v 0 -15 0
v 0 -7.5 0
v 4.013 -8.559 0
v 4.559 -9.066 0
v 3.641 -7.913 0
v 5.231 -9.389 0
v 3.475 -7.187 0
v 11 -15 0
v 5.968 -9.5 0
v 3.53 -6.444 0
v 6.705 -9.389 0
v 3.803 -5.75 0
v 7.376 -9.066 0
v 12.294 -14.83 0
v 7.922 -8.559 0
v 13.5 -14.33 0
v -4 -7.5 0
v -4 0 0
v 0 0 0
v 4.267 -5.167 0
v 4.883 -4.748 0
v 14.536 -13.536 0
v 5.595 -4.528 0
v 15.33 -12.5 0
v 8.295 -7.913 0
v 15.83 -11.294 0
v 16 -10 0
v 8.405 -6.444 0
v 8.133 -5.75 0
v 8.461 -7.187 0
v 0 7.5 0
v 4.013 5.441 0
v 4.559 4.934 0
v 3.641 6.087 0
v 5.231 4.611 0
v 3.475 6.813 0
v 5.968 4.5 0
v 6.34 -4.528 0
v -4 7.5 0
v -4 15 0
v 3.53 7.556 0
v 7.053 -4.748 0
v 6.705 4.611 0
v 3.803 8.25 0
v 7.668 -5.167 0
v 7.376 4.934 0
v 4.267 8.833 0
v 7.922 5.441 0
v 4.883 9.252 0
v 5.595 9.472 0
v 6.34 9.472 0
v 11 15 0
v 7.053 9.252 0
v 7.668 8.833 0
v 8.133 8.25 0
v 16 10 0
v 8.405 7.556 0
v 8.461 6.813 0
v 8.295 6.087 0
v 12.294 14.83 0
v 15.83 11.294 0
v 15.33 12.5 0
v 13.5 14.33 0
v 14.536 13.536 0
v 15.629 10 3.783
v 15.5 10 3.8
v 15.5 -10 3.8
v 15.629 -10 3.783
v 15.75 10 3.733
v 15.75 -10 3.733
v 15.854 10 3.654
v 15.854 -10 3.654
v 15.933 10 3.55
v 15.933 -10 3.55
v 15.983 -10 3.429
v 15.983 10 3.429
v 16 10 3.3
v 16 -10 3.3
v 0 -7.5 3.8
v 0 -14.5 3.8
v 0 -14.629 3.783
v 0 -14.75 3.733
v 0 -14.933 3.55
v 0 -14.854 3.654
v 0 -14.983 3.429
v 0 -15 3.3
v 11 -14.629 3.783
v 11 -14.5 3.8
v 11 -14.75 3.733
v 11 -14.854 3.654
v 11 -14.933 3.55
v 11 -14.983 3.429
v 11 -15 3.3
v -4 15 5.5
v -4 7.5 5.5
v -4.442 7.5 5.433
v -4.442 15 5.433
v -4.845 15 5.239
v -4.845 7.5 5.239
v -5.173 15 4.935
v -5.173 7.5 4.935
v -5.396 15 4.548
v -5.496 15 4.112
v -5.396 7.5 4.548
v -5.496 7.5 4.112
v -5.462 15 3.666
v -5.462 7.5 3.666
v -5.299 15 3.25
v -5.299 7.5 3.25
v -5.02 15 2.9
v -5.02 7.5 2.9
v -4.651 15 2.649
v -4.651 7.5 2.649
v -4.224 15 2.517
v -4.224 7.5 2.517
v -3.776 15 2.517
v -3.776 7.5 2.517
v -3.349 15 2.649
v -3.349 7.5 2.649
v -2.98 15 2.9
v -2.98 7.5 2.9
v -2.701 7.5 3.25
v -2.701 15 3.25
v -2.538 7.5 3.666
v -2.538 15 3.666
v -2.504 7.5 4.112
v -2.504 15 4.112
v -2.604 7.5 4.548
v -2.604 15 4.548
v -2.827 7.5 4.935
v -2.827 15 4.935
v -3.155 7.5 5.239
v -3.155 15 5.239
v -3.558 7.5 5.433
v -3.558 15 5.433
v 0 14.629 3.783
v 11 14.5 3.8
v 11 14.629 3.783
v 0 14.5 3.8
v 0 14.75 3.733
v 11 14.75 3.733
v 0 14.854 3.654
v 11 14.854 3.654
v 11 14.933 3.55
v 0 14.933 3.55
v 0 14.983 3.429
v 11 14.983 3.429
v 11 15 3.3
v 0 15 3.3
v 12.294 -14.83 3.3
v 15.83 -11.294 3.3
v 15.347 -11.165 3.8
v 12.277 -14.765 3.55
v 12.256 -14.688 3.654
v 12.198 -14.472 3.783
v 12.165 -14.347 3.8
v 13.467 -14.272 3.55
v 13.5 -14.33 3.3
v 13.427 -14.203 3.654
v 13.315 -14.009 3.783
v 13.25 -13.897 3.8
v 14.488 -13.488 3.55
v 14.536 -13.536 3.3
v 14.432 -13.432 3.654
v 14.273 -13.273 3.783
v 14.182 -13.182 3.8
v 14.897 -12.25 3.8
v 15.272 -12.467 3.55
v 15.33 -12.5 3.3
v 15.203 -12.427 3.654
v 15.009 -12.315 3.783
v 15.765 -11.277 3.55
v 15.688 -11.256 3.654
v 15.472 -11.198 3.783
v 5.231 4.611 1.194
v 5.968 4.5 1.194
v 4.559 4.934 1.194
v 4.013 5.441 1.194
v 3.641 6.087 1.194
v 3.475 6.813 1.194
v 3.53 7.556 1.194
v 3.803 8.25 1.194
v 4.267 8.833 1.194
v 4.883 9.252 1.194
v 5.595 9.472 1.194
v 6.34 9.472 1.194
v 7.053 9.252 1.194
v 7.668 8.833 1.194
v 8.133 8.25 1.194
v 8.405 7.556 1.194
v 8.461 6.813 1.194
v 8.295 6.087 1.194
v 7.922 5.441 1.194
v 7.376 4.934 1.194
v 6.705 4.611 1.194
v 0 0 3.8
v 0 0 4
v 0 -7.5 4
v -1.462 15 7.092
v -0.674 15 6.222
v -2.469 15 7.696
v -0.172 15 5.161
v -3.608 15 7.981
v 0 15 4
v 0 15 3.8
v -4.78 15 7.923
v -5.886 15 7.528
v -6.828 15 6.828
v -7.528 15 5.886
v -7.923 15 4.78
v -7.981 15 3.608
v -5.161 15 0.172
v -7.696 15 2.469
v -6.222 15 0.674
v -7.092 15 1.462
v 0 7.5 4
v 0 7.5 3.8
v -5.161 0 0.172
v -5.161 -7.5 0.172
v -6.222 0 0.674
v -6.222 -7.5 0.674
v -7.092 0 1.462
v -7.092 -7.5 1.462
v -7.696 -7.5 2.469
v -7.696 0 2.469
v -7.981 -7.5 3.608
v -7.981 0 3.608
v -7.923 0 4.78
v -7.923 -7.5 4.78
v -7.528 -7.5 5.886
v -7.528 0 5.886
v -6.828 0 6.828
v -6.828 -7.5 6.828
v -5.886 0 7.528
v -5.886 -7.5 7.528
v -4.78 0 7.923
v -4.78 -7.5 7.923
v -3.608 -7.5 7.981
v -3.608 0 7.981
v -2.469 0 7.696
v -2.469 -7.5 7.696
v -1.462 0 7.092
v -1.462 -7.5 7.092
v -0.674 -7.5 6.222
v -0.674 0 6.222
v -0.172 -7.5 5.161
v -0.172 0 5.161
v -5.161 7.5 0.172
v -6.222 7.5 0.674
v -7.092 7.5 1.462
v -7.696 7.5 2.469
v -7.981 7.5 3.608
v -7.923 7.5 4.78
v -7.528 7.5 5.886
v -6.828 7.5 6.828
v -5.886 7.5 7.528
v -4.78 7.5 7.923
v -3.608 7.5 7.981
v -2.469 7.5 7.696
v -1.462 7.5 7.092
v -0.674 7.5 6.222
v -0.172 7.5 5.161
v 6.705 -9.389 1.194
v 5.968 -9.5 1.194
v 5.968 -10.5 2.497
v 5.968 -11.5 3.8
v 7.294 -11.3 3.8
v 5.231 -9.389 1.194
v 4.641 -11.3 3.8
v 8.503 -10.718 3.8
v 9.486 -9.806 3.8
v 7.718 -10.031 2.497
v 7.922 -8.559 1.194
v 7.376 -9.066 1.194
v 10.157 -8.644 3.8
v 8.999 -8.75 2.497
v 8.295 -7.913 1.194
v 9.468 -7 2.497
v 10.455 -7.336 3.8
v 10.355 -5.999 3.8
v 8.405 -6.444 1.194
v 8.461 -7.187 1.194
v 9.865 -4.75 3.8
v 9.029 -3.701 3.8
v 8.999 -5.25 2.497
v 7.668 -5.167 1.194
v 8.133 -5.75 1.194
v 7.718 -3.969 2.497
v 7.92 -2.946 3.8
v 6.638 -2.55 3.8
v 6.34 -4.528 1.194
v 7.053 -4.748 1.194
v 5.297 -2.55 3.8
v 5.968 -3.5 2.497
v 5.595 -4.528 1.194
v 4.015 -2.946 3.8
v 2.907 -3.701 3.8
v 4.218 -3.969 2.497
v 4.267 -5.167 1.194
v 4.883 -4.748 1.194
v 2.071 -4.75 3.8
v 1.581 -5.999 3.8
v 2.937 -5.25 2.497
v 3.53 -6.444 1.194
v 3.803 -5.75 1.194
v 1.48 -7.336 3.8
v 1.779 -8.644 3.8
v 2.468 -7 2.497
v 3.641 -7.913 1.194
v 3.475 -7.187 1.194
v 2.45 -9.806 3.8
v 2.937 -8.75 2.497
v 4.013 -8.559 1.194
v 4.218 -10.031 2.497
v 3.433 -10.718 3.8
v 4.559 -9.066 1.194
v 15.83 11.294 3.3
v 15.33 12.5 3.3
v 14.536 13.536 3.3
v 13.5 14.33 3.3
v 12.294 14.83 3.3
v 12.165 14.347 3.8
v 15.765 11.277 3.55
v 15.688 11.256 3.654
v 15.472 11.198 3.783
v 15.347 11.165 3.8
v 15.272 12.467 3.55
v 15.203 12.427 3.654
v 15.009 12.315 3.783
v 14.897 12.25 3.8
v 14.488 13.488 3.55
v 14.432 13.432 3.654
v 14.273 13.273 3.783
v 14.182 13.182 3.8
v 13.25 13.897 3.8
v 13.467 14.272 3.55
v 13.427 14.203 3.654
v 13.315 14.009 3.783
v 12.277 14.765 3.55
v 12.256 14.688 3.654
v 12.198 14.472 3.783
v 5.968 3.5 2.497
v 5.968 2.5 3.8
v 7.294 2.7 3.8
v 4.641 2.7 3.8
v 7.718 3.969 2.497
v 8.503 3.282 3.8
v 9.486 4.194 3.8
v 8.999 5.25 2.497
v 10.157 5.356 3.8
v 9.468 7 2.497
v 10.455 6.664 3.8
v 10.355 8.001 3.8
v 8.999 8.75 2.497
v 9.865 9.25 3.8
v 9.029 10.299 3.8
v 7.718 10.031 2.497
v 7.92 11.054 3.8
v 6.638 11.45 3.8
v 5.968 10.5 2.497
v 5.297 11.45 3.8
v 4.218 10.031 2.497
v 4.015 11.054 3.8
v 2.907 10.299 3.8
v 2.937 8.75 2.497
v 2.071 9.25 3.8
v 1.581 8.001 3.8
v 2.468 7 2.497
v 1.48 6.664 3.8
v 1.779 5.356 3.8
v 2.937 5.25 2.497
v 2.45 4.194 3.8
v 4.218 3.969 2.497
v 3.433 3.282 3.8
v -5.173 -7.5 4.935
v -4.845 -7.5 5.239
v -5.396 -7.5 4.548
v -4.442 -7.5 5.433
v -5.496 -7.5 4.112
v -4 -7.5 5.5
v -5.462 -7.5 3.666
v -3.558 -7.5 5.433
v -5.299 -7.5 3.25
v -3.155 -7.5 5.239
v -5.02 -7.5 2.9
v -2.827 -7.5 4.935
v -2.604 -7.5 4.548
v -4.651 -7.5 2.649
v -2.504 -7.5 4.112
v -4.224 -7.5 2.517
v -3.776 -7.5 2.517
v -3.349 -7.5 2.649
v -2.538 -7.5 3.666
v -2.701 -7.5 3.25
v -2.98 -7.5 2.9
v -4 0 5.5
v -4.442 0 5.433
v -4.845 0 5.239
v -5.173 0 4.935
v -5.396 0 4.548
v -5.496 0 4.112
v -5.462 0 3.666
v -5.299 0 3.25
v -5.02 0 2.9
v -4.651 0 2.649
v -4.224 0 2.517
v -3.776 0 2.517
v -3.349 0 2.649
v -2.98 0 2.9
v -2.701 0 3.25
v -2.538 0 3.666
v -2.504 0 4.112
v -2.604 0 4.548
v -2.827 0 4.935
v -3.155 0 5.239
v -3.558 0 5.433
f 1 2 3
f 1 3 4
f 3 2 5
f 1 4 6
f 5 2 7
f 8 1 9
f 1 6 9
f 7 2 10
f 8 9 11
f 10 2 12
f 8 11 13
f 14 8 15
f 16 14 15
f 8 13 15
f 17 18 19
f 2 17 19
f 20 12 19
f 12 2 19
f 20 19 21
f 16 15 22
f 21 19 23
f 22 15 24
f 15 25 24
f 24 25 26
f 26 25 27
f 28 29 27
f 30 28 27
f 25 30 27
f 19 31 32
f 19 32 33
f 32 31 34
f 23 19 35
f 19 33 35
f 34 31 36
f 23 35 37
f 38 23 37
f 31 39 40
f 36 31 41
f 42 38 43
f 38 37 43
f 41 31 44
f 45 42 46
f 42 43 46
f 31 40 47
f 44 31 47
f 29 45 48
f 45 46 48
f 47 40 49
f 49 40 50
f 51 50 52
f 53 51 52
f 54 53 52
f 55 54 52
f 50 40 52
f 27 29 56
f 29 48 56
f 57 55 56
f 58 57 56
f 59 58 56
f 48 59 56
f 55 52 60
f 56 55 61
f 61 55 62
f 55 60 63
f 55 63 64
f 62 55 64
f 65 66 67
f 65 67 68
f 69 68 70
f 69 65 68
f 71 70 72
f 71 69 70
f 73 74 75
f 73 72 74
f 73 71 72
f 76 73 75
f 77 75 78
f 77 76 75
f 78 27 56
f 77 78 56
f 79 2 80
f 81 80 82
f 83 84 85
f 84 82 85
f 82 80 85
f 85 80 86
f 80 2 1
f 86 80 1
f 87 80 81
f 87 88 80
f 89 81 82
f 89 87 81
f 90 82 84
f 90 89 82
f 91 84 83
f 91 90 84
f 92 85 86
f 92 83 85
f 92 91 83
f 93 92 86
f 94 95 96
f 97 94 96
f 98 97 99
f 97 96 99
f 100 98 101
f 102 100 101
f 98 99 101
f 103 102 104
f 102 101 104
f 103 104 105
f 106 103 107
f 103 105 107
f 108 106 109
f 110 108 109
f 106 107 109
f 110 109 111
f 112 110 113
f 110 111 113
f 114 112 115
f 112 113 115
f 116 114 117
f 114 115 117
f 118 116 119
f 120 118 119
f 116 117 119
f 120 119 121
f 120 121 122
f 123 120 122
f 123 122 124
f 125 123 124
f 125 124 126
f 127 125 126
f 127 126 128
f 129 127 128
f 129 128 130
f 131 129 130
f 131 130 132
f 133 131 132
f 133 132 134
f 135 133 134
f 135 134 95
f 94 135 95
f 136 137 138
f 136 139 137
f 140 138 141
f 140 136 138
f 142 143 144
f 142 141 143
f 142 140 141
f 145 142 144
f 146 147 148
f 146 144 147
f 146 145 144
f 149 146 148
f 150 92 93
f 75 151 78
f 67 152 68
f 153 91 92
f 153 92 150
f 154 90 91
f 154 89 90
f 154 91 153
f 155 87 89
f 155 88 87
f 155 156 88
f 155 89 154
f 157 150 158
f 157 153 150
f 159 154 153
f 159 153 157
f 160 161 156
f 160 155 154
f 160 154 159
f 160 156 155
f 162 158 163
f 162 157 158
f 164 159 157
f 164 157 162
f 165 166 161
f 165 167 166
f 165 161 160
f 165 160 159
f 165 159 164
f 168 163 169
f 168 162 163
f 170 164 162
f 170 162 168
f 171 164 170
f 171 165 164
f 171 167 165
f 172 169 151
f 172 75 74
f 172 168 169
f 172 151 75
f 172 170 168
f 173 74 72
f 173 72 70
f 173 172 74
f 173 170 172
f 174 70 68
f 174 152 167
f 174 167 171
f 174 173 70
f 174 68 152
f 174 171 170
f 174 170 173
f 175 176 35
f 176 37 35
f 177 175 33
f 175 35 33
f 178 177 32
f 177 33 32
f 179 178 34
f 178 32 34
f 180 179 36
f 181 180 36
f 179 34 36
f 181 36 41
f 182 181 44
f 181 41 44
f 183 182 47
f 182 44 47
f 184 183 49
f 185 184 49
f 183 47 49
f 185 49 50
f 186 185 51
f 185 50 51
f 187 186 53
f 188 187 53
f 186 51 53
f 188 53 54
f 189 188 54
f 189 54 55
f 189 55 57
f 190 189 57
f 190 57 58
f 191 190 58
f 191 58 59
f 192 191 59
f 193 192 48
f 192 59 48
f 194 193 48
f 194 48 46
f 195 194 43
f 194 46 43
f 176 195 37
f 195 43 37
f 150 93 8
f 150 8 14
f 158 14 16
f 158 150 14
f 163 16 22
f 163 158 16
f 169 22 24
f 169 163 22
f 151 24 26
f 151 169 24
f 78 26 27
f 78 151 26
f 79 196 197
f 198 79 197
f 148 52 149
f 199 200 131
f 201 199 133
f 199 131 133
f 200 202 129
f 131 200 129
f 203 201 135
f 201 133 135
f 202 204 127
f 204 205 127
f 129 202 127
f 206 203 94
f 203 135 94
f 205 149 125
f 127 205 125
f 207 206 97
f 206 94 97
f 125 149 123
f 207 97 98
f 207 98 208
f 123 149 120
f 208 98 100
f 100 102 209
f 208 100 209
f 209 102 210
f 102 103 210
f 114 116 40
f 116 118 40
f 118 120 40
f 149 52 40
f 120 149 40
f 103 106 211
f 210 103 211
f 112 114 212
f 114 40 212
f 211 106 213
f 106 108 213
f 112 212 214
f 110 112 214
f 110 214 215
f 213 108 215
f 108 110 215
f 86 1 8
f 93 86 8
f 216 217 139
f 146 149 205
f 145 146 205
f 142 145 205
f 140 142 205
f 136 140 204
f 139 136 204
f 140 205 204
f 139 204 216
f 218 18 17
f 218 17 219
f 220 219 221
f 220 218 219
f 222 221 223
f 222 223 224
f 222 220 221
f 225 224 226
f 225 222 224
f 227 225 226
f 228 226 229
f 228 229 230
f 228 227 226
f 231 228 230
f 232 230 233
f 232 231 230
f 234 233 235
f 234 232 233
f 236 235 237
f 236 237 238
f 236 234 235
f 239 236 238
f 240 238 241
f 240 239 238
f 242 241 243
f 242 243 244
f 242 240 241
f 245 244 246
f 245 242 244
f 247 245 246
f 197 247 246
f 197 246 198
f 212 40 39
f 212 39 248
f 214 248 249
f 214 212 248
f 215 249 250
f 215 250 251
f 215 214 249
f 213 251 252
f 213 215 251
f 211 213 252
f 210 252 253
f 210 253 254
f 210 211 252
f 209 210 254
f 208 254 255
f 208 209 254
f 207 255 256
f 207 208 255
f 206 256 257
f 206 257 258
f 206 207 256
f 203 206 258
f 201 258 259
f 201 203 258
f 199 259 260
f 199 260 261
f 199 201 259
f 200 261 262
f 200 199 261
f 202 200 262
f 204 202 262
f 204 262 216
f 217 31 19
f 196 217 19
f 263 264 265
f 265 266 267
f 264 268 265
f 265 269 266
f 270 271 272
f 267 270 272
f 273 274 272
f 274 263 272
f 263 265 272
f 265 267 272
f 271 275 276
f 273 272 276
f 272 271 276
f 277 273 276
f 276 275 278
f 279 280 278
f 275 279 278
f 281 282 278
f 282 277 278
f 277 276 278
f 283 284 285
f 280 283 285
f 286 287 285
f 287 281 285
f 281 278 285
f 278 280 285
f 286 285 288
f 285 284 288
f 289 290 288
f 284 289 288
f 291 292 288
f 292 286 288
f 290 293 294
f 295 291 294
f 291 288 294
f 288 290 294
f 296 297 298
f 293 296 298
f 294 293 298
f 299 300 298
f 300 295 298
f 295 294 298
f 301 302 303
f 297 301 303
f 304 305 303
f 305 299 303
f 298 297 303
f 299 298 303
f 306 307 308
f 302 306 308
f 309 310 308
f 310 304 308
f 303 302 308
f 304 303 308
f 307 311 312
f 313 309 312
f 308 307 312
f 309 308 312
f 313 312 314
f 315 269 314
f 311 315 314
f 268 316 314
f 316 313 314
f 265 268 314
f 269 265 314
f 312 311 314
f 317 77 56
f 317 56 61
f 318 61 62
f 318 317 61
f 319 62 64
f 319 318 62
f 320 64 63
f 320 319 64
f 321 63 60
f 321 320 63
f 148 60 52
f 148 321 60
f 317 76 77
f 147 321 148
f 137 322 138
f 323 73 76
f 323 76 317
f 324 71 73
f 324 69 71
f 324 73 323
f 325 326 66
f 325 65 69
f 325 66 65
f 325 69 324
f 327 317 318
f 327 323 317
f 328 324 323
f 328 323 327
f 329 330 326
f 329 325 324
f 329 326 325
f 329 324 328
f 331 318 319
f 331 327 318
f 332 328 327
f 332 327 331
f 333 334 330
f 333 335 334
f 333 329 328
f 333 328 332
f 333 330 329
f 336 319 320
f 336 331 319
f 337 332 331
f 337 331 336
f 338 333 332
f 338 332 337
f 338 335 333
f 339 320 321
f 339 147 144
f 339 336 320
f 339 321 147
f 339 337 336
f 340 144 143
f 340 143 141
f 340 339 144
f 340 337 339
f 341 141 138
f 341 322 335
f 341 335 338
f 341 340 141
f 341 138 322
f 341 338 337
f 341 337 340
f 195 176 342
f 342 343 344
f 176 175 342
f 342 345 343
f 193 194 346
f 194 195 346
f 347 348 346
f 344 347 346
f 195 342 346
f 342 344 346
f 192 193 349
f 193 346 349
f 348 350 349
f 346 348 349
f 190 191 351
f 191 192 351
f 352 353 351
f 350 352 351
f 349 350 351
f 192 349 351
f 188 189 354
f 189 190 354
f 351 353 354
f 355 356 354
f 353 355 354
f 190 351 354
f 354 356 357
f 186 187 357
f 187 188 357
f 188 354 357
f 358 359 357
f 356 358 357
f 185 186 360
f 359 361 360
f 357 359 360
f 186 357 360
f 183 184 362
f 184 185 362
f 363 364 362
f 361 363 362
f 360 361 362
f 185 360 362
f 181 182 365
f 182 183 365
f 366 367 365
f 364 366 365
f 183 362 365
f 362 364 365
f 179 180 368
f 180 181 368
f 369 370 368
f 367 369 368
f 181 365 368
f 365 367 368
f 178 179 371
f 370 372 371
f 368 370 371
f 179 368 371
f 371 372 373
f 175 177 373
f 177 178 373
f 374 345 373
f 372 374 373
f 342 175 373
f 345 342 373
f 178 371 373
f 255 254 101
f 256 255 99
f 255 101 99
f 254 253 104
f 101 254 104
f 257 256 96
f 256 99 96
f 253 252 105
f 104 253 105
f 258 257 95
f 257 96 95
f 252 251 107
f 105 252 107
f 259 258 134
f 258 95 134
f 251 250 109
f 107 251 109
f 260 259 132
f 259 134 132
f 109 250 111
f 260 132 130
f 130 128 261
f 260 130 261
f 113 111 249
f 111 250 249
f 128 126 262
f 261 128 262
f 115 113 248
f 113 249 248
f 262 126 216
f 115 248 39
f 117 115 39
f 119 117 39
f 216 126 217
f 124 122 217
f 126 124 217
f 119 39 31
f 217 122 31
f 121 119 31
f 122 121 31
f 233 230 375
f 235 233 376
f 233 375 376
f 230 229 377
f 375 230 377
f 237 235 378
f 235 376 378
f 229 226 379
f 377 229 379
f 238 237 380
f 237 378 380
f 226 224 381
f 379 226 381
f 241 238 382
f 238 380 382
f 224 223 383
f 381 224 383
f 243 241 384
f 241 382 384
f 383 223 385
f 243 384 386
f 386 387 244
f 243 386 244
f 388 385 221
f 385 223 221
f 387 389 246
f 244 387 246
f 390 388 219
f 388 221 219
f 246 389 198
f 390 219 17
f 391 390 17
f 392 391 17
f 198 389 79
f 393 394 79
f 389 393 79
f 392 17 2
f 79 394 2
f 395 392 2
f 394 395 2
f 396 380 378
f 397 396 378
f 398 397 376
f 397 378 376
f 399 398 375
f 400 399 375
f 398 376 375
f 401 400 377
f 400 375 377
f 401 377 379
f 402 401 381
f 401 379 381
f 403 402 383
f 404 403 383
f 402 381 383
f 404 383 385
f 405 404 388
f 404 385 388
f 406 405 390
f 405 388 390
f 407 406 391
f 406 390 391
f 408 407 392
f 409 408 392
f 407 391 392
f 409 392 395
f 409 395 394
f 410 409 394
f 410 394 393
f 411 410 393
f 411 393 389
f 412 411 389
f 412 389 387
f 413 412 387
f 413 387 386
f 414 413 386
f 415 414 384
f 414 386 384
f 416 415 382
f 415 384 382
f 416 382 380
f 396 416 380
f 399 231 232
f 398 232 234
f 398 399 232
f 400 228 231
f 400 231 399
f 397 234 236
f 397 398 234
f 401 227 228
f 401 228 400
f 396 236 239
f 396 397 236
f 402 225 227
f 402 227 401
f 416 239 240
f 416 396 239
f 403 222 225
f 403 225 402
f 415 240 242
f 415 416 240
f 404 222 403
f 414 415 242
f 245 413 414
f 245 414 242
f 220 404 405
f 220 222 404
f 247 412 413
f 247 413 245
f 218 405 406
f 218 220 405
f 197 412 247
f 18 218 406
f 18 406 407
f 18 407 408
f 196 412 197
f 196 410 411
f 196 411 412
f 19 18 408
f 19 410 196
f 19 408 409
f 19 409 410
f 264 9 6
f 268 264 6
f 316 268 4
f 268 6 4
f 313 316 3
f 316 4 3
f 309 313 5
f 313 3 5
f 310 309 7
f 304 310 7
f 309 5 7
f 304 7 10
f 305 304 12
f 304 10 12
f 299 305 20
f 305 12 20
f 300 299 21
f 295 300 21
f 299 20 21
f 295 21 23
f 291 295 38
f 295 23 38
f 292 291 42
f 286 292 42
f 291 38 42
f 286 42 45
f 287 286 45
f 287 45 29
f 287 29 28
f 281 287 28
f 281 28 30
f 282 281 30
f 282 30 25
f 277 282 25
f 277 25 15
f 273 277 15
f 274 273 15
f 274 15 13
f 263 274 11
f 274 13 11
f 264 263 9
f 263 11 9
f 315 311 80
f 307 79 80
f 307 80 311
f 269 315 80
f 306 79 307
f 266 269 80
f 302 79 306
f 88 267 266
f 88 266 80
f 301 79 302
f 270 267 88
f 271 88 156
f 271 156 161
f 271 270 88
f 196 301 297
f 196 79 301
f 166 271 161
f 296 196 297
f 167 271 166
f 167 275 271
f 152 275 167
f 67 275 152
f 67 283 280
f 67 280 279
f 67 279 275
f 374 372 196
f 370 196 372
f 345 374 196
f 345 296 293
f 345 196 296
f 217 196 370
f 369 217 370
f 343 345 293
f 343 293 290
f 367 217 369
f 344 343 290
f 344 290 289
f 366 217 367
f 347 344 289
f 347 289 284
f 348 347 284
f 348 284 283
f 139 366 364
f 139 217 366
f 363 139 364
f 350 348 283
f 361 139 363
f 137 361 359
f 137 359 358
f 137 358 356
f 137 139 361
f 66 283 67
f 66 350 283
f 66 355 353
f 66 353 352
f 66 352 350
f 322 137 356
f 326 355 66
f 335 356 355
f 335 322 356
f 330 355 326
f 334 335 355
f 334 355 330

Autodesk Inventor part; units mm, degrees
ref_plane "YZ Plane" through (0, 0, 0) normal (1, 0, 0) x (0, 1, 0)
ref_plane "XZ Plane" through (0, 0, 0) normal (0, 1, 0) x (-1, 0, 0)
ref_plane "XY Plane" through (0, 0, 0) normal (0, 0, 1) x (1, 0, 0)
sketch "Esquisse7" plane through (0, 0, 0) normal (0, 0, 1) x (1, 0, 0)
  line L0 (0, -15) -> (16, -15)
  line L1 (16, -15) -> (16, 15)
  line L2 (16, 15) -> (0, 15)
  line L3 (0, 15) -> (0, -15)
  point P0 (0, 0)
  point P1 (0, 0)
  dimension "Largueur" = 16
  dimension "Hauteur" = 30
extrude "Extrusion4" add sketch "Esquisse7" along normal blind 3.8
sketch "Esquisse9" plane through (0, 15, 0) normal (0, 1, 0) x (1, 0, 0)
  arc A0 (-4, 0) -> (0, -4) centre (-4, -4) ccw
  line L0 (0, 0) -> (0, -3.8) construction
  line L1 (16, 0) -> (0, 0) construction
  line L2 (-4, 0) -> (0, 0)
  line L3 (0, 0) -> (0, -4)
  dimension "d41" = 8
extrude "Extrusion6" add sketch "Esquisse9" against normal blind 7.5
pattern_linear "Réseau rectangulaire3" count 2 spacing 15 along (0, -1, 0) of "Extrusion6"
sketch "Esquisse10" plane through (16, 15, 3.8) normal (0, 1, 0) x (1, 0, 0)
  arc A0 (-20, 3.8) -> (-16, -0.2) centre (-20, -0.2) ccw construction
  point P0 (-16, 3.8)
  point P1 (-16.0515, -0.84)
hole "Perçage2" at (-4, 15, 4) direction (0, -1, 0) diameter 3 end through all
fillet "Congé4" radius 5 2 edges at (16, 15, 1.9) (16, -15, 1.9)
sketch "Esquisse11" plane through (0, 0, 3.8) normal (0, 0, 1) x (1, 0, 0)
  line L0 (11, 15) -> (0, 15) construction
  point P0 (0, 0)
  point P1 (5.9678, 7)
  point P2 (5.9678, -7)
  point P3 (0.9356, 15)
  point P4 (5.9678, 15)
  dimension "d56" = 14
  dimension "d57" = 7
hole "Perçage3" at (5.9678, 7, 3.8) at (5.9678, -7, 3.8) direction (0, 0, -1) diameter 5 end through all countersink diameter 9 countersink angle 75
fillet "Congé5" radius 0.5 5 edges at (14.5355, 13.5355, 3.8) (16, 0, 3.8) (14.5355, -13.5355, 3.8) (5.5, -15, 3.8) (5.5, 15, 3.8)
equation "\"d42\" = 0.25 * Hauteur"
equation "\"d47\" = 0.5 * Hauteur"
equation "\"d57\" = 0.5 * d56"
equation "\"pi\" = 3.141593"
equation "\"nombredor\" = 1.61803"
properties part number "Charnière A" material "Plastique ABS"
